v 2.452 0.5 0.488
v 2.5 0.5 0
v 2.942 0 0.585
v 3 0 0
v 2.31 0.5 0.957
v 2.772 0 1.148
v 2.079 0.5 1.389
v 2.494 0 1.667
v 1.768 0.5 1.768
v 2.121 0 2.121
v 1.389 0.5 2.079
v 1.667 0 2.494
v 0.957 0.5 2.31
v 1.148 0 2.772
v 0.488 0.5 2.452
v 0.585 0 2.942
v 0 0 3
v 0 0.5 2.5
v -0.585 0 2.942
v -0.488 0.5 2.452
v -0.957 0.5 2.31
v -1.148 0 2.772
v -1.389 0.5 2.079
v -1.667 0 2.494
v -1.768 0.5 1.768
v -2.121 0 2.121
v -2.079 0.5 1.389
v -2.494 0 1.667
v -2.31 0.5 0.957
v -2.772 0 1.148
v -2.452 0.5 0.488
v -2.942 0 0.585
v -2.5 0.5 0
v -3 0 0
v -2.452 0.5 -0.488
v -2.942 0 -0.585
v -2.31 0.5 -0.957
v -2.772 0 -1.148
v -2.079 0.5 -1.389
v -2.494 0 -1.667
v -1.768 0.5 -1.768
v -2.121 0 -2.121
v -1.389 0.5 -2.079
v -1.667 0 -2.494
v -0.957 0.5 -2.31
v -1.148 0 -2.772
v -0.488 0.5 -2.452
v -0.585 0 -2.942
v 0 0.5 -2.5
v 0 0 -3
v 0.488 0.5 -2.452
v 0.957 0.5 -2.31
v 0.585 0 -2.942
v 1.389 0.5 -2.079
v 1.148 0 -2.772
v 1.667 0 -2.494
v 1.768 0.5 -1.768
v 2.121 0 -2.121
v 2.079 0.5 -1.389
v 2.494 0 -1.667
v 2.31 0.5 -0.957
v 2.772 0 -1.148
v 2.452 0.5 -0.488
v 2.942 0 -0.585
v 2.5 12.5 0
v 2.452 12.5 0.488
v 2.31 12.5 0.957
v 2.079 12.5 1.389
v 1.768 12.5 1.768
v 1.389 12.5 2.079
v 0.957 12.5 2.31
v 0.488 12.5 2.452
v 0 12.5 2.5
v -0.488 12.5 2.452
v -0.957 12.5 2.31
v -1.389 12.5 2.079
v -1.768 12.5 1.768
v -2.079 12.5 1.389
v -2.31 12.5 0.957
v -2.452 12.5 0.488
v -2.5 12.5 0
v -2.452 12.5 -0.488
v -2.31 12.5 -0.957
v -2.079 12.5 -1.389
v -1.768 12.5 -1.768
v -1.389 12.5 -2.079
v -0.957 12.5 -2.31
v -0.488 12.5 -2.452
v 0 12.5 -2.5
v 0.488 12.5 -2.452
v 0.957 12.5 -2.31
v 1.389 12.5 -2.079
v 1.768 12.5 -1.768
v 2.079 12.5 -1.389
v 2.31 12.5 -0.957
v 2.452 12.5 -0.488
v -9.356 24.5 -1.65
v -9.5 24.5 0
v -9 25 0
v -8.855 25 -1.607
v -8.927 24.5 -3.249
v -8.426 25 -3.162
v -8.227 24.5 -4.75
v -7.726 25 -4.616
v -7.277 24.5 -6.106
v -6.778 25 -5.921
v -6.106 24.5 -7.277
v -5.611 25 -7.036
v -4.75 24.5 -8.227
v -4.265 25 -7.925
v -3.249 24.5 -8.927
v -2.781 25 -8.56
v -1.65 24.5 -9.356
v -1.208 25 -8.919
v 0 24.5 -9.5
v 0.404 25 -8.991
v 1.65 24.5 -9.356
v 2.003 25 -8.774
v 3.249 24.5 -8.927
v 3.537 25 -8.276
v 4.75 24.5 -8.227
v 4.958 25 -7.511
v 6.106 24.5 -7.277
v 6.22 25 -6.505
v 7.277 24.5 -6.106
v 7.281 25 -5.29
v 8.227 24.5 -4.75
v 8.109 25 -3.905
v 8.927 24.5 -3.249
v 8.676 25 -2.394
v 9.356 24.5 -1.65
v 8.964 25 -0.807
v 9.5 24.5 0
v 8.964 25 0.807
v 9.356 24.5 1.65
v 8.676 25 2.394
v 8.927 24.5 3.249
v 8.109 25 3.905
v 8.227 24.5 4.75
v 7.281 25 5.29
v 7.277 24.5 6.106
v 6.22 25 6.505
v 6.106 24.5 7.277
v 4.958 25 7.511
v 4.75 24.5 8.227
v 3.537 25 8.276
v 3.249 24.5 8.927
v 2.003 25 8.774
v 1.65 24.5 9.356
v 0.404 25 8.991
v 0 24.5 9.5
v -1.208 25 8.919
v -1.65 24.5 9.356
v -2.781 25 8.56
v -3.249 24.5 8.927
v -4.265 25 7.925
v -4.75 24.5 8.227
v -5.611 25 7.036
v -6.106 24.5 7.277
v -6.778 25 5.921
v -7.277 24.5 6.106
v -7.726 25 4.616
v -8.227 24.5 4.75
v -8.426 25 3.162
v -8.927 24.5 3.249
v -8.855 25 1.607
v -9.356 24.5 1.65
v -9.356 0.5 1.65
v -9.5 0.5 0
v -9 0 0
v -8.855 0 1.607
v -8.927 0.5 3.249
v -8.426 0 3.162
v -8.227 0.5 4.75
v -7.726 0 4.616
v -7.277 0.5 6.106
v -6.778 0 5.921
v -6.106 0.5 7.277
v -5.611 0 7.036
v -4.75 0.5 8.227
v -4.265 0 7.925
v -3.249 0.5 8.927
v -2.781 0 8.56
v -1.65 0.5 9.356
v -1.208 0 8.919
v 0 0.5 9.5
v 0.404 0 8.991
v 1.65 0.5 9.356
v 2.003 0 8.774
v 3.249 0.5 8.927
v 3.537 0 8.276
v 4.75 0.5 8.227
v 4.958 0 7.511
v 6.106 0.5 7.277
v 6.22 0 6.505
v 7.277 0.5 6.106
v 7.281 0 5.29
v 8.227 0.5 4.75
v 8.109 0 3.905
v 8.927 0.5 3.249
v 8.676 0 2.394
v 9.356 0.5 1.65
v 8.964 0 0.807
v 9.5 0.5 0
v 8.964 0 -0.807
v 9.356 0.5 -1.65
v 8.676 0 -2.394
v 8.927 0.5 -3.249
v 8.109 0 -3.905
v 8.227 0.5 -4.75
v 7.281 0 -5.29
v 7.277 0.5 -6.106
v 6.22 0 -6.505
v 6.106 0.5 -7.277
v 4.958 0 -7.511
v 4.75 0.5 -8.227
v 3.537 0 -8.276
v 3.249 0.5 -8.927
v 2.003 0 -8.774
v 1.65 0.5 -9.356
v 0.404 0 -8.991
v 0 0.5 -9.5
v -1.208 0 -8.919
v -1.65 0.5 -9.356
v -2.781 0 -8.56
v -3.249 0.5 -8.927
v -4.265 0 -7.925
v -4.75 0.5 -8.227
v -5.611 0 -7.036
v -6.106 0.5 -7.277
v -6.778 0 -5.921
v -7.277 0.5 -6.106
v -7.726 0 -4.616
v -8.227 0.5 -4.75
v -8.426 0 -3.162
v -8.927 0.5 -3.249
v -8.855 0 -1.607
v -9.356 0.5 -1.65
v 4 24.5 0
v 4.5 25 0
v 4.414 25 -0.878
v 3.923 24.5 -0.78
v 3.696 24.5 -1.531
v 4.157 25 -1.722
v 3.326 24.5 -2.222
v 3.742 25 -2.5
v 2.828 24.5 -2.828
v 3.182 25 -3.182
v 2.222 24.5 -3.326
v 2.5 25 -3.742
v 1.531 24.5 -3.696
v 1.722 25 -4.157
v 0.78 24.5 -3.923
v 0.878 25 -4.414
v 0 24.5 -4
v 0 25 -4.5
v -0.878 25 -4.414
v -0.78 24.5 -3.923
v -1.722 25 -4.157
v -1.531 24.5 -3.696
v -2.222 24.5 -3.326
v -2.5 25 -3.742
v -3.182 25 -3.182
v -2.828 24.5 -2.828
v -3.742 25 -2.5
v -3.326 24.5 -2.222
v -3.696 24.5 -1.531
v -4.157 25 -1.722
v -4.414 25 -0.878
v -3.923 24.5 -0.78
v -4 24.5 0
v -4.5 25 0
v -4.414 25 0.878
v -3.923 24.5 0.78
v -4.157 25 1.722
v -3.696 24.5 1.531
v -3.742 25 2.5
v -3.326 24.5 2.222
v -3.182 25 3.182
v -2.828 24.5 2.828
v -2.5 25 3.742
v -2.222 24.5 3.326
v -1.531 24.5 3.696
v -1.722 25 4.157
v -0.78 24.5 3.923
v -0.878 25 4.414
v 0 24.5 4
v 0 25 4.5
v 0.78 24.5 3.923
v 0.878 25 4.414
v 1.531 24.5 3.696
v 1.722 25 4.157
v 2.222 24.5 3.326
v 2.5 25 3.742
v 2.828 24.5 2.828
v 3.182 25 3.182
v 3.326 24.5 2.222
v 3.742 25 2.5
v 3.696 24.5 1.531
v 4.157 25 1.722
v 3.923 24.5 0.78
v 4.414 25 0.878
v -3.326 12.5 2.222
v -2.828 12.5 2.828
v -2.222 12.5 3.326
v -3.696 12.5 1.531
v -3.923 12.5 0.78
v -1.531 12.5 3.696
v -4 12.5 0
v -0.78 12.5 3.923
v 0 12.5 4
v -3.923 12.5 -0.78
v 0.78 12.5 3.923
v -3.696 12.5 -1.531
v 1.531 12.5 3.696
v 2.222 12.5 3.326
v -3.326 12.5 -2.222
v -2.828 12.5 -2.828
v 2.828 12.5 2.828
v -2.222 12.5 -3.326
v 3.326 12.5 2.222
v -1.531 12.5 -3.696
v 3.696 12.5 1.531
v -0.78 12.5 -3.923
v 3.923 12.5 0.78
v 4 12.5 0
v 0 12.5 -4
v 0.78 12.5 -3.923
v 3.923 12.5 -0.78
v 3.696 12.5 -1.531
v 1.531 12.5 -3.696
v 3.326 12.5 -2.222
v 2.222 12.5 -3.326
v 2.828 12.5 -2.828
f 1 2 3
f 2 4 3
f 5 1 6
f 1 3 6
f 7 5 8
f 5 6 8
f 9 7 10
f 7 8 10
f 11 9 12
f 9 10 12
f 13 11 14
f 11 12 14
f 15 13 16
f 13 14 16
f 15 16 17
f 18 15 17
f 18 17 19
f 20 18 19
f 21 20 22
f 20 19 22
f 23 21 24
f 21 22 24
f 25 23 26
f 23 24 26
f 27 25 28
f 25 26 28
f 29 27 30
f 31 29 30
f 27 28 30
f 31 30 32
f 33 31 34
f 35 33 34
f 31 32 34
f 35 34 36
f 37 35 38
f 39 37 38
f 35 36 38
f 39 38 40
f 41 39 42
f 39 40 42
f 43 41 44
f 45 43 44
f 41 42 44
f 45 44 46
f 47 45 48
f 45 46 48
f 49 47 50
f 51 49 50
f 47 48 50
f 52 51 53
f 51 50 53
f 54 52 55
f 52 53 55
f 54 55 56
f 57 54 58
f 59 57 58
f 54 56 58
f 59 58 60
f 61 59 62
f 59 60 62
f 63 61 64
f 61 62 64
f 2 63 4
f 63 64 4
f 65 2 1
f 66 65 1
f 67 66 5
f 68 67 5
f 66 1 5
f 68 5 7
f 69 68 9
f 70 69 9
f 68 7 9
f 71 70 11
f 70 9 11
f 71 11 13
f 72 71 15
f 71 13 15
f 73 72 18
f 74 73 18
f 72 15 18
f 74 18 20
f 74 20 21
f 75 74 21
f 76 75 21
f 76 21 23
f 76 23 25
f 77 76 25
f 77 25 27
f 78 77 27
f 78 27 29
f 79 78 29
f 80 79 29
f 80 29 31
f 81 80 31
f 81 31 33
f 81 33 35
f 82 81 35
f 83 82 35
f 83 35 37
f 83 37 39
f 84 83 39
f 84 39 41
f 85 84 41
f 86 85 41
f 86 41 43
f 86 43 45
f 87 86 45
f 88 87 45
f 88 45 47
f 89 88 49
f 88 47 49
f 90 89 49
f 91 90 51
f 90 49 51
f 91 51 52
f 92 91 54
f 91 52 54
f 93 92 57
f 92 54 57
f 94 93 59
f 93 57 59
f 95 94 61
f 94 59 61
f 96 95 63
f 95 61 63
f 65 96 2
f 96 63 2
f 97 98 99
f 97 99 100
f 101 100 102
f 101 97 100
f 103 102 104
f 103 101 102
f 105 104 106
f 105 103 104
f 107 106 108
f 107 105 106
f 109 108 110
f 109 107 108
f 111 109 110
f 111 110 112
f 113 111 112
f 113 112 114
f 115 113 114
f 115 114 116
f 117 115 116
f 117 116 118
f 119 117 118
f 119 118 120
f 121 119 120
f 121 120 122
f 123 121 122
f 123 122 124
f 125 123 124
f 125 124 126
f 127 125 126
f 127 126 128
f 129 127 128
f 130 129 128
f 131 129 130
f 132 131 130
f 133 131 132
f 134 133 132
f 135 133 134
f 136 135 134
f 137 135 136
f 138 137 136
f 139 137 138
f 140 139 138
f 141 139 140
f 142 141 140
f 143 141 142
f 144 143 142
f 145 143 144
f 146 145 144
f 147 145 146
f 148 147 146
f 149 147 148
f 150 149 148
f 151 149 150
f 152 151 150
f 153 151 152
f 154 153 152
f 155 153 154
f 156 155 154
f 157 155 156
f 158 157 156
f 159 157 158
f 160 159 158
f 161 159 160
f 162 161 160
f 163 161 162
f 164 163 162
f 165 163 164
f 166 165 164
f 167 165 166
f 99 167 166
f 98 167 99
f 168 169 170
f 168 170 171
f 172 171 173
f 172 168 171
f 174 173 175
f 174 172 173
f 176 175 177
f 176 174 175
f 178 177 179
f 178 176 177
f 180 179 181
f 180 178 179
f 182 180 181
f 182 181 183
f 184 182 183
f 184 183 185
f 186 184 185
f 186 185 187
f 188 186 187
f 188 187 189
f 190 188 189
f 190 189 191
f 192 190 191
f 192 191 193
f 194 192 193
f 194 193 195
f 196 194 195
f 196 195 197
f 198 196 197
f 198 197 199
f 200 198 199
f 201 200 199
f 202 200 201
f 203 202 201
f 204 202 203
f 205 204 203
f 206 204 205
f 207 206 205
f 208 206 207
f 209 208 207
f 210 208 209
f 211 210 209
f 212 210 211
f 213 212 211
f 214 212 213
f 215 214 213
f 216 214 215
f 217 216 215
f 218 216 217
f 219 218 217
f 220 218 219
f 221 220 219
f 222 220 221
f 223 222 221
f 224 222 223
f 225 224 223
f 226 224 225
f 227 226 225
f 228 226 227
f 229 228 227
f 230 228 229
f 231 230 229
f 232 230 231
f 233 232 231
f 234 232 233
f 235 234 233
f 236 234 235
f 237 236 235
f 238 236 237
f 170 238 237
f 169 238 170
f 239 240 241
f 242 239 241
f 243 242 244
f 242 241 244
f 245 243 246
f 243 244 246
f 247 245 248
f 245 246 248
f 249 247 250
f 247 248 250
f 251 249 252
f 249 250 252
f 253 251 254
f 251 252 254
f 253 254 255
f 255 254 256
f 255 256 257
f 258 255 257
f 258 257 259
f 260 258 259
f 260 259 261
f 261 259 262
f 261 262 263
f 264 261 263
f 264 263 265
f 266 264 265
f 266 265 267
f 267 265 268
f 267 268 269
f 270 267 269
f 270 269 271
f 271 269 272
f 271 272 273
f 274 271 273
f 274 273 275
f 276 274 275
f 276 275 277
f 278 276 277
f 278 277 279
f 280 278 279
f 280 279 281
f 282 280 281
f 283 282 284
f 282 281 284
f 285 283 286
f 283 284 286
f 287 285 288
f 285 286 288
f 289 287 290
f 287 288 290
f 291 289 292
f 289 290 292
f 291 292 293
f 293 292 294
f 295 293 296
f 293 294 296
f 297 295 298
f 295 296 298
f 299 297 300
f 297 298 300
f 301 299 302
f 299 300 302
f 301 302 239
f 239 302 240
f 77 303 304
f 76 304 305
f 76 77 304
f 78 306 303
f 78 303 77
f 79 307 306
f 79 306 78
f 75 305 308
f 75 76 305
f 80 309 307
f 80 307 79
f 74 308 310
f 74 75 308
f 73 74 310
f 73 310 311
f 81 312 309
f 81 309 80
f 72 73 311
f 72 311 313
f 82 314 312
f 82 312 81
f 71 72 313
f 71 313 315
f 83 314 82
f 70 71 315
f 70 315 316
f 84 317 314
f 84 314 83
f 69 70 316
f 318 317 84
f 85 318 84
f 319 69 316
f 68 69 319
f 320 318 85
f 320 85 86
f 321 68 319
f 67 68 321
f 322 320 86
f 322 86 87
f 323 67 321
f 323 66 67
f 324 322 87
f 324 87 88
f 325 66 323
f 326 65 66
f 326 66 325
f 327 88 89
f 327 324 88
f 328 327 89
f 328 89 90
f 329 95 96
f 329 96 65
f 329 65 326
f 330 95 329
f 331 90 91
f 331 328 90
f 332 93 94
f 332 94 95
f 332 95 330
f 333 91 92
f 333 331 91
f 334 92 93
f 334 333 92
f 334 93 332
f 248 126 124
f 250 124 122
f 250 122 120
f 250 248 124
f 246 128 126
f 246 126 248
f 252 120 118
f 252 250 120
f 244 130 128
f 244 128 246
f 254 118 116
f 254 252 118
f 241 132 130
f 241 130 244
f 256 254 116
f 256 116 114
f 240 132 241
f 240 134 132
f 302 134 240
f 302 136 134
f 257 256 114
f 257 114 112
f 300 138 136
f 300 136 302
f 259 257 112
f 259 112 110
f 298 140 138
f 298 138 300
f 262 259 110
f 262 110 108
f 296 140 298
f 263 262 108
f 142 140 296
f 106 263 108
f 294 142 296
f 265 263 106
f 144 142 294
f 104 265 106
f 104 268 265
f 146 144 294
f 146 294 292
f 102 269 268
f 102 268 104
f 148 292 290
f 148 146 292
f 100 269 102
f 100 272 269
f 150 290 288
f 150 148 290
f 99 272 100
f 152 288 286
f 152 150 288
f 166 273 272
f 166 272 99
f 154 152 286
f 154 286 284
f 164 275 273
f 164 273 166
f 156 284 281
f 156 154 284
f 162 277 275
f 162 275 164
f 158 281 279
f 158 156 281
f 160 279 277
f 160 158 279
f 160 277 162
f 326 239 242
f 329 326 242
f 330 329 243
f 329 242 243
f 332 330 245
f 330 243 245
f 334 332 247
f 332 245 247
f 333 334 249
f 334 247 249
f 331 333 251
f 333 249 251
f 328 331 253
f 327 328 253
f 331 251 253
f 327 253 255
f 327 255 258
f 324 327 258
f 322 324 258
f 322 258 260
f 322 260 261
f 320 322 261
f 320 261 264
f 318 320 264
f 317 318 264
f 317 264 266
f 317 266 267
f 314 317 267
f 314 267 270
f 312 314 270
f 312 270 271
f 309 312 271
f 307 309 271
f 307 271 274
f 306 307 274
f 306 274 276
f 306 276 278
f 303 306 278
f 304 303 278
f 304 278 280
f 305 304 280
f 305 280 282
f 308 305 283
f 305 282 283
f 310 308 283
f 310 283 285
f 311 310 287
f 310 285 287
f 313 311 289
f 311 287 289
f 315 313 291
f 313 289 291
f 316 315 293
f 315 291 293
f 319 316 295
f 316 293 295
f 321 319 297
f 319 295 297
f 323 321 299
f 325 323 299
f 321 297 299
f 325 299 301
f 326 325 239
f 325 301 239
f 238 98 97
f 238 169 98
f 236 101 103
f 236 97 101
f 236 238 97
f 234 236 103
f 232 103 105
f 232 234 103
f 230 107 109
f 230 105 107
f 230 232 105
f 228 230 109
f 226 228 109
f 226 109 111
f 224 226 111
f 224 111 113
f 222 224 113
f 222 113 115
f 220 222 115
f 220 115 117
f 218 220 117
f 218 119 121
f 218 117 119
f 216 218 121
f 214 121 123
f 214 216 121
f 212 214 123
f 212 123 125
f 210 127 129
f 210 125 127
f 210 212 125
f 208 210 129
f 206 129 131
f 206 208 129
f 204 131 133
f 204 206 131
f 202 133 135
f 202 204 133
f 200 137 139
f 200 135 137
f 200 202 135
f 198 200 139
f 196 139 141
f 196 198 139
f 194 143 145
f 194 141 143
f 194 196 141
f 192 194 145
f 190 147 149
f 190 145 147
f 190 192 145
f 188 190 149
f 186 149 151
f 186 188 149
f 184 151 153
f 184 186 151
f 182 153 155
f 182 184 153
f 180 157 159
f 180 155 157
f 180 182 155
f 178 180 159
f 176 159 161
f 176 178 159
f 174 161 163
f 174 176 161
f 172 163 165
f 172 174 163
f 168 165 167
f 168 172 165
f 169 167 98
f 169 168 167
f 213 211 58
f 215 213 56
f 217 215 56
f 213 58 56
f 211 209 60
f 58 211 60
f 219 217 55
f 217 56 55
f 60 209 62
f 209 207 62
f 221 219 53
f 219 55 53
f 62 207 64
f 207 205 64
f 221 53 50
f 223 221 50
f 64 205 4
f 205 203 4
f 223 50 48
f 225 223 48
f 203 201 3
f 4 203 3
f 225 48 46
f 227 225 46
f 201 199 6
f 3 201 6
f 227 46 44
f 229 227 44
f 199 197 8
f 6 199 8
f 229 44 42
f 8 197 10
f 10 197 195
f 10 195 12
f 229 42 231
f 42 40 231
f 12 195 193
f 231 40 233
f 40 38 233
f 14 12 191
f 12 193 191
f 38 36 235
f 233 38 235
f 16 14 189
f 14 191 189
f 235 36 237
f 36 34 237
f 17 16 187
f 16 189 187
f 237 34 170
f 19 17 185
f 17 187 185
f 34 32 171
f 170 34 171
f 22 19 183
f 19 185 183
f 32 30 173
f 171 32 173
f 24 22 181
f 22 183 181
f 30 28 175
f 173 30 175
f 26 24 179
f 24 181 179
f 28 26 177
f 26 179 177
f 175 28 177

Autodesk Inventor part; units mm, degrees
ref_plane "YZ Plane" through (0, 0, 0) normal (1, 0, 0) x (0, 1, 0)
ref_plane "XZ Plane" through (0, 0, 0) normal (0, 1, 0) x (-1, 0, 0)
ref_plane "XY Plane" through (0, 0, 0) normal (0, 0, 1) x (1, 0, 0)
sketch "Эскиз1" plane through (0, 0, 0) normal (0, 1, 0) x (-1, 0, 0)
  circle A0 centre (0, 0) radius 9.5
  dimension "d0" = 19
extrude "Выдавливание1" add sketch "Эскиз1" along normal blind 25
sketch "Эскиз2" plane through (0, 25, 0) normal (0, 1, 0) x (1, 0, 0)
  circle A0 centre (0, 0) radius 4
  dimension "d3" = 8
extrude "Выдавливание2" cut sketch "Эскиз2" against normal blind 12.5
sketch "Эскиз3" plane through (0, 0, 0) normal (0, -1, 0) x (1, 0, 0)
  circle A0 centre (0, 0) radius 2.5
  dimension "d6" = 5
extrude "Выдавливание3" cut sketch "Эскиз3" against normal through all
thread "Резьба1" size "M20x2.5" class "6g" standard "ANSI Metric M Profile" length 9 offset 8
chamfer "Фаска1" distance 0.5 angle 45 4 edges at (-4, 25, 0) (9.5, 25, 0) (9.5, 0, 0) (-2.5, 0, 0)
properties part number "mufta_5x8"
